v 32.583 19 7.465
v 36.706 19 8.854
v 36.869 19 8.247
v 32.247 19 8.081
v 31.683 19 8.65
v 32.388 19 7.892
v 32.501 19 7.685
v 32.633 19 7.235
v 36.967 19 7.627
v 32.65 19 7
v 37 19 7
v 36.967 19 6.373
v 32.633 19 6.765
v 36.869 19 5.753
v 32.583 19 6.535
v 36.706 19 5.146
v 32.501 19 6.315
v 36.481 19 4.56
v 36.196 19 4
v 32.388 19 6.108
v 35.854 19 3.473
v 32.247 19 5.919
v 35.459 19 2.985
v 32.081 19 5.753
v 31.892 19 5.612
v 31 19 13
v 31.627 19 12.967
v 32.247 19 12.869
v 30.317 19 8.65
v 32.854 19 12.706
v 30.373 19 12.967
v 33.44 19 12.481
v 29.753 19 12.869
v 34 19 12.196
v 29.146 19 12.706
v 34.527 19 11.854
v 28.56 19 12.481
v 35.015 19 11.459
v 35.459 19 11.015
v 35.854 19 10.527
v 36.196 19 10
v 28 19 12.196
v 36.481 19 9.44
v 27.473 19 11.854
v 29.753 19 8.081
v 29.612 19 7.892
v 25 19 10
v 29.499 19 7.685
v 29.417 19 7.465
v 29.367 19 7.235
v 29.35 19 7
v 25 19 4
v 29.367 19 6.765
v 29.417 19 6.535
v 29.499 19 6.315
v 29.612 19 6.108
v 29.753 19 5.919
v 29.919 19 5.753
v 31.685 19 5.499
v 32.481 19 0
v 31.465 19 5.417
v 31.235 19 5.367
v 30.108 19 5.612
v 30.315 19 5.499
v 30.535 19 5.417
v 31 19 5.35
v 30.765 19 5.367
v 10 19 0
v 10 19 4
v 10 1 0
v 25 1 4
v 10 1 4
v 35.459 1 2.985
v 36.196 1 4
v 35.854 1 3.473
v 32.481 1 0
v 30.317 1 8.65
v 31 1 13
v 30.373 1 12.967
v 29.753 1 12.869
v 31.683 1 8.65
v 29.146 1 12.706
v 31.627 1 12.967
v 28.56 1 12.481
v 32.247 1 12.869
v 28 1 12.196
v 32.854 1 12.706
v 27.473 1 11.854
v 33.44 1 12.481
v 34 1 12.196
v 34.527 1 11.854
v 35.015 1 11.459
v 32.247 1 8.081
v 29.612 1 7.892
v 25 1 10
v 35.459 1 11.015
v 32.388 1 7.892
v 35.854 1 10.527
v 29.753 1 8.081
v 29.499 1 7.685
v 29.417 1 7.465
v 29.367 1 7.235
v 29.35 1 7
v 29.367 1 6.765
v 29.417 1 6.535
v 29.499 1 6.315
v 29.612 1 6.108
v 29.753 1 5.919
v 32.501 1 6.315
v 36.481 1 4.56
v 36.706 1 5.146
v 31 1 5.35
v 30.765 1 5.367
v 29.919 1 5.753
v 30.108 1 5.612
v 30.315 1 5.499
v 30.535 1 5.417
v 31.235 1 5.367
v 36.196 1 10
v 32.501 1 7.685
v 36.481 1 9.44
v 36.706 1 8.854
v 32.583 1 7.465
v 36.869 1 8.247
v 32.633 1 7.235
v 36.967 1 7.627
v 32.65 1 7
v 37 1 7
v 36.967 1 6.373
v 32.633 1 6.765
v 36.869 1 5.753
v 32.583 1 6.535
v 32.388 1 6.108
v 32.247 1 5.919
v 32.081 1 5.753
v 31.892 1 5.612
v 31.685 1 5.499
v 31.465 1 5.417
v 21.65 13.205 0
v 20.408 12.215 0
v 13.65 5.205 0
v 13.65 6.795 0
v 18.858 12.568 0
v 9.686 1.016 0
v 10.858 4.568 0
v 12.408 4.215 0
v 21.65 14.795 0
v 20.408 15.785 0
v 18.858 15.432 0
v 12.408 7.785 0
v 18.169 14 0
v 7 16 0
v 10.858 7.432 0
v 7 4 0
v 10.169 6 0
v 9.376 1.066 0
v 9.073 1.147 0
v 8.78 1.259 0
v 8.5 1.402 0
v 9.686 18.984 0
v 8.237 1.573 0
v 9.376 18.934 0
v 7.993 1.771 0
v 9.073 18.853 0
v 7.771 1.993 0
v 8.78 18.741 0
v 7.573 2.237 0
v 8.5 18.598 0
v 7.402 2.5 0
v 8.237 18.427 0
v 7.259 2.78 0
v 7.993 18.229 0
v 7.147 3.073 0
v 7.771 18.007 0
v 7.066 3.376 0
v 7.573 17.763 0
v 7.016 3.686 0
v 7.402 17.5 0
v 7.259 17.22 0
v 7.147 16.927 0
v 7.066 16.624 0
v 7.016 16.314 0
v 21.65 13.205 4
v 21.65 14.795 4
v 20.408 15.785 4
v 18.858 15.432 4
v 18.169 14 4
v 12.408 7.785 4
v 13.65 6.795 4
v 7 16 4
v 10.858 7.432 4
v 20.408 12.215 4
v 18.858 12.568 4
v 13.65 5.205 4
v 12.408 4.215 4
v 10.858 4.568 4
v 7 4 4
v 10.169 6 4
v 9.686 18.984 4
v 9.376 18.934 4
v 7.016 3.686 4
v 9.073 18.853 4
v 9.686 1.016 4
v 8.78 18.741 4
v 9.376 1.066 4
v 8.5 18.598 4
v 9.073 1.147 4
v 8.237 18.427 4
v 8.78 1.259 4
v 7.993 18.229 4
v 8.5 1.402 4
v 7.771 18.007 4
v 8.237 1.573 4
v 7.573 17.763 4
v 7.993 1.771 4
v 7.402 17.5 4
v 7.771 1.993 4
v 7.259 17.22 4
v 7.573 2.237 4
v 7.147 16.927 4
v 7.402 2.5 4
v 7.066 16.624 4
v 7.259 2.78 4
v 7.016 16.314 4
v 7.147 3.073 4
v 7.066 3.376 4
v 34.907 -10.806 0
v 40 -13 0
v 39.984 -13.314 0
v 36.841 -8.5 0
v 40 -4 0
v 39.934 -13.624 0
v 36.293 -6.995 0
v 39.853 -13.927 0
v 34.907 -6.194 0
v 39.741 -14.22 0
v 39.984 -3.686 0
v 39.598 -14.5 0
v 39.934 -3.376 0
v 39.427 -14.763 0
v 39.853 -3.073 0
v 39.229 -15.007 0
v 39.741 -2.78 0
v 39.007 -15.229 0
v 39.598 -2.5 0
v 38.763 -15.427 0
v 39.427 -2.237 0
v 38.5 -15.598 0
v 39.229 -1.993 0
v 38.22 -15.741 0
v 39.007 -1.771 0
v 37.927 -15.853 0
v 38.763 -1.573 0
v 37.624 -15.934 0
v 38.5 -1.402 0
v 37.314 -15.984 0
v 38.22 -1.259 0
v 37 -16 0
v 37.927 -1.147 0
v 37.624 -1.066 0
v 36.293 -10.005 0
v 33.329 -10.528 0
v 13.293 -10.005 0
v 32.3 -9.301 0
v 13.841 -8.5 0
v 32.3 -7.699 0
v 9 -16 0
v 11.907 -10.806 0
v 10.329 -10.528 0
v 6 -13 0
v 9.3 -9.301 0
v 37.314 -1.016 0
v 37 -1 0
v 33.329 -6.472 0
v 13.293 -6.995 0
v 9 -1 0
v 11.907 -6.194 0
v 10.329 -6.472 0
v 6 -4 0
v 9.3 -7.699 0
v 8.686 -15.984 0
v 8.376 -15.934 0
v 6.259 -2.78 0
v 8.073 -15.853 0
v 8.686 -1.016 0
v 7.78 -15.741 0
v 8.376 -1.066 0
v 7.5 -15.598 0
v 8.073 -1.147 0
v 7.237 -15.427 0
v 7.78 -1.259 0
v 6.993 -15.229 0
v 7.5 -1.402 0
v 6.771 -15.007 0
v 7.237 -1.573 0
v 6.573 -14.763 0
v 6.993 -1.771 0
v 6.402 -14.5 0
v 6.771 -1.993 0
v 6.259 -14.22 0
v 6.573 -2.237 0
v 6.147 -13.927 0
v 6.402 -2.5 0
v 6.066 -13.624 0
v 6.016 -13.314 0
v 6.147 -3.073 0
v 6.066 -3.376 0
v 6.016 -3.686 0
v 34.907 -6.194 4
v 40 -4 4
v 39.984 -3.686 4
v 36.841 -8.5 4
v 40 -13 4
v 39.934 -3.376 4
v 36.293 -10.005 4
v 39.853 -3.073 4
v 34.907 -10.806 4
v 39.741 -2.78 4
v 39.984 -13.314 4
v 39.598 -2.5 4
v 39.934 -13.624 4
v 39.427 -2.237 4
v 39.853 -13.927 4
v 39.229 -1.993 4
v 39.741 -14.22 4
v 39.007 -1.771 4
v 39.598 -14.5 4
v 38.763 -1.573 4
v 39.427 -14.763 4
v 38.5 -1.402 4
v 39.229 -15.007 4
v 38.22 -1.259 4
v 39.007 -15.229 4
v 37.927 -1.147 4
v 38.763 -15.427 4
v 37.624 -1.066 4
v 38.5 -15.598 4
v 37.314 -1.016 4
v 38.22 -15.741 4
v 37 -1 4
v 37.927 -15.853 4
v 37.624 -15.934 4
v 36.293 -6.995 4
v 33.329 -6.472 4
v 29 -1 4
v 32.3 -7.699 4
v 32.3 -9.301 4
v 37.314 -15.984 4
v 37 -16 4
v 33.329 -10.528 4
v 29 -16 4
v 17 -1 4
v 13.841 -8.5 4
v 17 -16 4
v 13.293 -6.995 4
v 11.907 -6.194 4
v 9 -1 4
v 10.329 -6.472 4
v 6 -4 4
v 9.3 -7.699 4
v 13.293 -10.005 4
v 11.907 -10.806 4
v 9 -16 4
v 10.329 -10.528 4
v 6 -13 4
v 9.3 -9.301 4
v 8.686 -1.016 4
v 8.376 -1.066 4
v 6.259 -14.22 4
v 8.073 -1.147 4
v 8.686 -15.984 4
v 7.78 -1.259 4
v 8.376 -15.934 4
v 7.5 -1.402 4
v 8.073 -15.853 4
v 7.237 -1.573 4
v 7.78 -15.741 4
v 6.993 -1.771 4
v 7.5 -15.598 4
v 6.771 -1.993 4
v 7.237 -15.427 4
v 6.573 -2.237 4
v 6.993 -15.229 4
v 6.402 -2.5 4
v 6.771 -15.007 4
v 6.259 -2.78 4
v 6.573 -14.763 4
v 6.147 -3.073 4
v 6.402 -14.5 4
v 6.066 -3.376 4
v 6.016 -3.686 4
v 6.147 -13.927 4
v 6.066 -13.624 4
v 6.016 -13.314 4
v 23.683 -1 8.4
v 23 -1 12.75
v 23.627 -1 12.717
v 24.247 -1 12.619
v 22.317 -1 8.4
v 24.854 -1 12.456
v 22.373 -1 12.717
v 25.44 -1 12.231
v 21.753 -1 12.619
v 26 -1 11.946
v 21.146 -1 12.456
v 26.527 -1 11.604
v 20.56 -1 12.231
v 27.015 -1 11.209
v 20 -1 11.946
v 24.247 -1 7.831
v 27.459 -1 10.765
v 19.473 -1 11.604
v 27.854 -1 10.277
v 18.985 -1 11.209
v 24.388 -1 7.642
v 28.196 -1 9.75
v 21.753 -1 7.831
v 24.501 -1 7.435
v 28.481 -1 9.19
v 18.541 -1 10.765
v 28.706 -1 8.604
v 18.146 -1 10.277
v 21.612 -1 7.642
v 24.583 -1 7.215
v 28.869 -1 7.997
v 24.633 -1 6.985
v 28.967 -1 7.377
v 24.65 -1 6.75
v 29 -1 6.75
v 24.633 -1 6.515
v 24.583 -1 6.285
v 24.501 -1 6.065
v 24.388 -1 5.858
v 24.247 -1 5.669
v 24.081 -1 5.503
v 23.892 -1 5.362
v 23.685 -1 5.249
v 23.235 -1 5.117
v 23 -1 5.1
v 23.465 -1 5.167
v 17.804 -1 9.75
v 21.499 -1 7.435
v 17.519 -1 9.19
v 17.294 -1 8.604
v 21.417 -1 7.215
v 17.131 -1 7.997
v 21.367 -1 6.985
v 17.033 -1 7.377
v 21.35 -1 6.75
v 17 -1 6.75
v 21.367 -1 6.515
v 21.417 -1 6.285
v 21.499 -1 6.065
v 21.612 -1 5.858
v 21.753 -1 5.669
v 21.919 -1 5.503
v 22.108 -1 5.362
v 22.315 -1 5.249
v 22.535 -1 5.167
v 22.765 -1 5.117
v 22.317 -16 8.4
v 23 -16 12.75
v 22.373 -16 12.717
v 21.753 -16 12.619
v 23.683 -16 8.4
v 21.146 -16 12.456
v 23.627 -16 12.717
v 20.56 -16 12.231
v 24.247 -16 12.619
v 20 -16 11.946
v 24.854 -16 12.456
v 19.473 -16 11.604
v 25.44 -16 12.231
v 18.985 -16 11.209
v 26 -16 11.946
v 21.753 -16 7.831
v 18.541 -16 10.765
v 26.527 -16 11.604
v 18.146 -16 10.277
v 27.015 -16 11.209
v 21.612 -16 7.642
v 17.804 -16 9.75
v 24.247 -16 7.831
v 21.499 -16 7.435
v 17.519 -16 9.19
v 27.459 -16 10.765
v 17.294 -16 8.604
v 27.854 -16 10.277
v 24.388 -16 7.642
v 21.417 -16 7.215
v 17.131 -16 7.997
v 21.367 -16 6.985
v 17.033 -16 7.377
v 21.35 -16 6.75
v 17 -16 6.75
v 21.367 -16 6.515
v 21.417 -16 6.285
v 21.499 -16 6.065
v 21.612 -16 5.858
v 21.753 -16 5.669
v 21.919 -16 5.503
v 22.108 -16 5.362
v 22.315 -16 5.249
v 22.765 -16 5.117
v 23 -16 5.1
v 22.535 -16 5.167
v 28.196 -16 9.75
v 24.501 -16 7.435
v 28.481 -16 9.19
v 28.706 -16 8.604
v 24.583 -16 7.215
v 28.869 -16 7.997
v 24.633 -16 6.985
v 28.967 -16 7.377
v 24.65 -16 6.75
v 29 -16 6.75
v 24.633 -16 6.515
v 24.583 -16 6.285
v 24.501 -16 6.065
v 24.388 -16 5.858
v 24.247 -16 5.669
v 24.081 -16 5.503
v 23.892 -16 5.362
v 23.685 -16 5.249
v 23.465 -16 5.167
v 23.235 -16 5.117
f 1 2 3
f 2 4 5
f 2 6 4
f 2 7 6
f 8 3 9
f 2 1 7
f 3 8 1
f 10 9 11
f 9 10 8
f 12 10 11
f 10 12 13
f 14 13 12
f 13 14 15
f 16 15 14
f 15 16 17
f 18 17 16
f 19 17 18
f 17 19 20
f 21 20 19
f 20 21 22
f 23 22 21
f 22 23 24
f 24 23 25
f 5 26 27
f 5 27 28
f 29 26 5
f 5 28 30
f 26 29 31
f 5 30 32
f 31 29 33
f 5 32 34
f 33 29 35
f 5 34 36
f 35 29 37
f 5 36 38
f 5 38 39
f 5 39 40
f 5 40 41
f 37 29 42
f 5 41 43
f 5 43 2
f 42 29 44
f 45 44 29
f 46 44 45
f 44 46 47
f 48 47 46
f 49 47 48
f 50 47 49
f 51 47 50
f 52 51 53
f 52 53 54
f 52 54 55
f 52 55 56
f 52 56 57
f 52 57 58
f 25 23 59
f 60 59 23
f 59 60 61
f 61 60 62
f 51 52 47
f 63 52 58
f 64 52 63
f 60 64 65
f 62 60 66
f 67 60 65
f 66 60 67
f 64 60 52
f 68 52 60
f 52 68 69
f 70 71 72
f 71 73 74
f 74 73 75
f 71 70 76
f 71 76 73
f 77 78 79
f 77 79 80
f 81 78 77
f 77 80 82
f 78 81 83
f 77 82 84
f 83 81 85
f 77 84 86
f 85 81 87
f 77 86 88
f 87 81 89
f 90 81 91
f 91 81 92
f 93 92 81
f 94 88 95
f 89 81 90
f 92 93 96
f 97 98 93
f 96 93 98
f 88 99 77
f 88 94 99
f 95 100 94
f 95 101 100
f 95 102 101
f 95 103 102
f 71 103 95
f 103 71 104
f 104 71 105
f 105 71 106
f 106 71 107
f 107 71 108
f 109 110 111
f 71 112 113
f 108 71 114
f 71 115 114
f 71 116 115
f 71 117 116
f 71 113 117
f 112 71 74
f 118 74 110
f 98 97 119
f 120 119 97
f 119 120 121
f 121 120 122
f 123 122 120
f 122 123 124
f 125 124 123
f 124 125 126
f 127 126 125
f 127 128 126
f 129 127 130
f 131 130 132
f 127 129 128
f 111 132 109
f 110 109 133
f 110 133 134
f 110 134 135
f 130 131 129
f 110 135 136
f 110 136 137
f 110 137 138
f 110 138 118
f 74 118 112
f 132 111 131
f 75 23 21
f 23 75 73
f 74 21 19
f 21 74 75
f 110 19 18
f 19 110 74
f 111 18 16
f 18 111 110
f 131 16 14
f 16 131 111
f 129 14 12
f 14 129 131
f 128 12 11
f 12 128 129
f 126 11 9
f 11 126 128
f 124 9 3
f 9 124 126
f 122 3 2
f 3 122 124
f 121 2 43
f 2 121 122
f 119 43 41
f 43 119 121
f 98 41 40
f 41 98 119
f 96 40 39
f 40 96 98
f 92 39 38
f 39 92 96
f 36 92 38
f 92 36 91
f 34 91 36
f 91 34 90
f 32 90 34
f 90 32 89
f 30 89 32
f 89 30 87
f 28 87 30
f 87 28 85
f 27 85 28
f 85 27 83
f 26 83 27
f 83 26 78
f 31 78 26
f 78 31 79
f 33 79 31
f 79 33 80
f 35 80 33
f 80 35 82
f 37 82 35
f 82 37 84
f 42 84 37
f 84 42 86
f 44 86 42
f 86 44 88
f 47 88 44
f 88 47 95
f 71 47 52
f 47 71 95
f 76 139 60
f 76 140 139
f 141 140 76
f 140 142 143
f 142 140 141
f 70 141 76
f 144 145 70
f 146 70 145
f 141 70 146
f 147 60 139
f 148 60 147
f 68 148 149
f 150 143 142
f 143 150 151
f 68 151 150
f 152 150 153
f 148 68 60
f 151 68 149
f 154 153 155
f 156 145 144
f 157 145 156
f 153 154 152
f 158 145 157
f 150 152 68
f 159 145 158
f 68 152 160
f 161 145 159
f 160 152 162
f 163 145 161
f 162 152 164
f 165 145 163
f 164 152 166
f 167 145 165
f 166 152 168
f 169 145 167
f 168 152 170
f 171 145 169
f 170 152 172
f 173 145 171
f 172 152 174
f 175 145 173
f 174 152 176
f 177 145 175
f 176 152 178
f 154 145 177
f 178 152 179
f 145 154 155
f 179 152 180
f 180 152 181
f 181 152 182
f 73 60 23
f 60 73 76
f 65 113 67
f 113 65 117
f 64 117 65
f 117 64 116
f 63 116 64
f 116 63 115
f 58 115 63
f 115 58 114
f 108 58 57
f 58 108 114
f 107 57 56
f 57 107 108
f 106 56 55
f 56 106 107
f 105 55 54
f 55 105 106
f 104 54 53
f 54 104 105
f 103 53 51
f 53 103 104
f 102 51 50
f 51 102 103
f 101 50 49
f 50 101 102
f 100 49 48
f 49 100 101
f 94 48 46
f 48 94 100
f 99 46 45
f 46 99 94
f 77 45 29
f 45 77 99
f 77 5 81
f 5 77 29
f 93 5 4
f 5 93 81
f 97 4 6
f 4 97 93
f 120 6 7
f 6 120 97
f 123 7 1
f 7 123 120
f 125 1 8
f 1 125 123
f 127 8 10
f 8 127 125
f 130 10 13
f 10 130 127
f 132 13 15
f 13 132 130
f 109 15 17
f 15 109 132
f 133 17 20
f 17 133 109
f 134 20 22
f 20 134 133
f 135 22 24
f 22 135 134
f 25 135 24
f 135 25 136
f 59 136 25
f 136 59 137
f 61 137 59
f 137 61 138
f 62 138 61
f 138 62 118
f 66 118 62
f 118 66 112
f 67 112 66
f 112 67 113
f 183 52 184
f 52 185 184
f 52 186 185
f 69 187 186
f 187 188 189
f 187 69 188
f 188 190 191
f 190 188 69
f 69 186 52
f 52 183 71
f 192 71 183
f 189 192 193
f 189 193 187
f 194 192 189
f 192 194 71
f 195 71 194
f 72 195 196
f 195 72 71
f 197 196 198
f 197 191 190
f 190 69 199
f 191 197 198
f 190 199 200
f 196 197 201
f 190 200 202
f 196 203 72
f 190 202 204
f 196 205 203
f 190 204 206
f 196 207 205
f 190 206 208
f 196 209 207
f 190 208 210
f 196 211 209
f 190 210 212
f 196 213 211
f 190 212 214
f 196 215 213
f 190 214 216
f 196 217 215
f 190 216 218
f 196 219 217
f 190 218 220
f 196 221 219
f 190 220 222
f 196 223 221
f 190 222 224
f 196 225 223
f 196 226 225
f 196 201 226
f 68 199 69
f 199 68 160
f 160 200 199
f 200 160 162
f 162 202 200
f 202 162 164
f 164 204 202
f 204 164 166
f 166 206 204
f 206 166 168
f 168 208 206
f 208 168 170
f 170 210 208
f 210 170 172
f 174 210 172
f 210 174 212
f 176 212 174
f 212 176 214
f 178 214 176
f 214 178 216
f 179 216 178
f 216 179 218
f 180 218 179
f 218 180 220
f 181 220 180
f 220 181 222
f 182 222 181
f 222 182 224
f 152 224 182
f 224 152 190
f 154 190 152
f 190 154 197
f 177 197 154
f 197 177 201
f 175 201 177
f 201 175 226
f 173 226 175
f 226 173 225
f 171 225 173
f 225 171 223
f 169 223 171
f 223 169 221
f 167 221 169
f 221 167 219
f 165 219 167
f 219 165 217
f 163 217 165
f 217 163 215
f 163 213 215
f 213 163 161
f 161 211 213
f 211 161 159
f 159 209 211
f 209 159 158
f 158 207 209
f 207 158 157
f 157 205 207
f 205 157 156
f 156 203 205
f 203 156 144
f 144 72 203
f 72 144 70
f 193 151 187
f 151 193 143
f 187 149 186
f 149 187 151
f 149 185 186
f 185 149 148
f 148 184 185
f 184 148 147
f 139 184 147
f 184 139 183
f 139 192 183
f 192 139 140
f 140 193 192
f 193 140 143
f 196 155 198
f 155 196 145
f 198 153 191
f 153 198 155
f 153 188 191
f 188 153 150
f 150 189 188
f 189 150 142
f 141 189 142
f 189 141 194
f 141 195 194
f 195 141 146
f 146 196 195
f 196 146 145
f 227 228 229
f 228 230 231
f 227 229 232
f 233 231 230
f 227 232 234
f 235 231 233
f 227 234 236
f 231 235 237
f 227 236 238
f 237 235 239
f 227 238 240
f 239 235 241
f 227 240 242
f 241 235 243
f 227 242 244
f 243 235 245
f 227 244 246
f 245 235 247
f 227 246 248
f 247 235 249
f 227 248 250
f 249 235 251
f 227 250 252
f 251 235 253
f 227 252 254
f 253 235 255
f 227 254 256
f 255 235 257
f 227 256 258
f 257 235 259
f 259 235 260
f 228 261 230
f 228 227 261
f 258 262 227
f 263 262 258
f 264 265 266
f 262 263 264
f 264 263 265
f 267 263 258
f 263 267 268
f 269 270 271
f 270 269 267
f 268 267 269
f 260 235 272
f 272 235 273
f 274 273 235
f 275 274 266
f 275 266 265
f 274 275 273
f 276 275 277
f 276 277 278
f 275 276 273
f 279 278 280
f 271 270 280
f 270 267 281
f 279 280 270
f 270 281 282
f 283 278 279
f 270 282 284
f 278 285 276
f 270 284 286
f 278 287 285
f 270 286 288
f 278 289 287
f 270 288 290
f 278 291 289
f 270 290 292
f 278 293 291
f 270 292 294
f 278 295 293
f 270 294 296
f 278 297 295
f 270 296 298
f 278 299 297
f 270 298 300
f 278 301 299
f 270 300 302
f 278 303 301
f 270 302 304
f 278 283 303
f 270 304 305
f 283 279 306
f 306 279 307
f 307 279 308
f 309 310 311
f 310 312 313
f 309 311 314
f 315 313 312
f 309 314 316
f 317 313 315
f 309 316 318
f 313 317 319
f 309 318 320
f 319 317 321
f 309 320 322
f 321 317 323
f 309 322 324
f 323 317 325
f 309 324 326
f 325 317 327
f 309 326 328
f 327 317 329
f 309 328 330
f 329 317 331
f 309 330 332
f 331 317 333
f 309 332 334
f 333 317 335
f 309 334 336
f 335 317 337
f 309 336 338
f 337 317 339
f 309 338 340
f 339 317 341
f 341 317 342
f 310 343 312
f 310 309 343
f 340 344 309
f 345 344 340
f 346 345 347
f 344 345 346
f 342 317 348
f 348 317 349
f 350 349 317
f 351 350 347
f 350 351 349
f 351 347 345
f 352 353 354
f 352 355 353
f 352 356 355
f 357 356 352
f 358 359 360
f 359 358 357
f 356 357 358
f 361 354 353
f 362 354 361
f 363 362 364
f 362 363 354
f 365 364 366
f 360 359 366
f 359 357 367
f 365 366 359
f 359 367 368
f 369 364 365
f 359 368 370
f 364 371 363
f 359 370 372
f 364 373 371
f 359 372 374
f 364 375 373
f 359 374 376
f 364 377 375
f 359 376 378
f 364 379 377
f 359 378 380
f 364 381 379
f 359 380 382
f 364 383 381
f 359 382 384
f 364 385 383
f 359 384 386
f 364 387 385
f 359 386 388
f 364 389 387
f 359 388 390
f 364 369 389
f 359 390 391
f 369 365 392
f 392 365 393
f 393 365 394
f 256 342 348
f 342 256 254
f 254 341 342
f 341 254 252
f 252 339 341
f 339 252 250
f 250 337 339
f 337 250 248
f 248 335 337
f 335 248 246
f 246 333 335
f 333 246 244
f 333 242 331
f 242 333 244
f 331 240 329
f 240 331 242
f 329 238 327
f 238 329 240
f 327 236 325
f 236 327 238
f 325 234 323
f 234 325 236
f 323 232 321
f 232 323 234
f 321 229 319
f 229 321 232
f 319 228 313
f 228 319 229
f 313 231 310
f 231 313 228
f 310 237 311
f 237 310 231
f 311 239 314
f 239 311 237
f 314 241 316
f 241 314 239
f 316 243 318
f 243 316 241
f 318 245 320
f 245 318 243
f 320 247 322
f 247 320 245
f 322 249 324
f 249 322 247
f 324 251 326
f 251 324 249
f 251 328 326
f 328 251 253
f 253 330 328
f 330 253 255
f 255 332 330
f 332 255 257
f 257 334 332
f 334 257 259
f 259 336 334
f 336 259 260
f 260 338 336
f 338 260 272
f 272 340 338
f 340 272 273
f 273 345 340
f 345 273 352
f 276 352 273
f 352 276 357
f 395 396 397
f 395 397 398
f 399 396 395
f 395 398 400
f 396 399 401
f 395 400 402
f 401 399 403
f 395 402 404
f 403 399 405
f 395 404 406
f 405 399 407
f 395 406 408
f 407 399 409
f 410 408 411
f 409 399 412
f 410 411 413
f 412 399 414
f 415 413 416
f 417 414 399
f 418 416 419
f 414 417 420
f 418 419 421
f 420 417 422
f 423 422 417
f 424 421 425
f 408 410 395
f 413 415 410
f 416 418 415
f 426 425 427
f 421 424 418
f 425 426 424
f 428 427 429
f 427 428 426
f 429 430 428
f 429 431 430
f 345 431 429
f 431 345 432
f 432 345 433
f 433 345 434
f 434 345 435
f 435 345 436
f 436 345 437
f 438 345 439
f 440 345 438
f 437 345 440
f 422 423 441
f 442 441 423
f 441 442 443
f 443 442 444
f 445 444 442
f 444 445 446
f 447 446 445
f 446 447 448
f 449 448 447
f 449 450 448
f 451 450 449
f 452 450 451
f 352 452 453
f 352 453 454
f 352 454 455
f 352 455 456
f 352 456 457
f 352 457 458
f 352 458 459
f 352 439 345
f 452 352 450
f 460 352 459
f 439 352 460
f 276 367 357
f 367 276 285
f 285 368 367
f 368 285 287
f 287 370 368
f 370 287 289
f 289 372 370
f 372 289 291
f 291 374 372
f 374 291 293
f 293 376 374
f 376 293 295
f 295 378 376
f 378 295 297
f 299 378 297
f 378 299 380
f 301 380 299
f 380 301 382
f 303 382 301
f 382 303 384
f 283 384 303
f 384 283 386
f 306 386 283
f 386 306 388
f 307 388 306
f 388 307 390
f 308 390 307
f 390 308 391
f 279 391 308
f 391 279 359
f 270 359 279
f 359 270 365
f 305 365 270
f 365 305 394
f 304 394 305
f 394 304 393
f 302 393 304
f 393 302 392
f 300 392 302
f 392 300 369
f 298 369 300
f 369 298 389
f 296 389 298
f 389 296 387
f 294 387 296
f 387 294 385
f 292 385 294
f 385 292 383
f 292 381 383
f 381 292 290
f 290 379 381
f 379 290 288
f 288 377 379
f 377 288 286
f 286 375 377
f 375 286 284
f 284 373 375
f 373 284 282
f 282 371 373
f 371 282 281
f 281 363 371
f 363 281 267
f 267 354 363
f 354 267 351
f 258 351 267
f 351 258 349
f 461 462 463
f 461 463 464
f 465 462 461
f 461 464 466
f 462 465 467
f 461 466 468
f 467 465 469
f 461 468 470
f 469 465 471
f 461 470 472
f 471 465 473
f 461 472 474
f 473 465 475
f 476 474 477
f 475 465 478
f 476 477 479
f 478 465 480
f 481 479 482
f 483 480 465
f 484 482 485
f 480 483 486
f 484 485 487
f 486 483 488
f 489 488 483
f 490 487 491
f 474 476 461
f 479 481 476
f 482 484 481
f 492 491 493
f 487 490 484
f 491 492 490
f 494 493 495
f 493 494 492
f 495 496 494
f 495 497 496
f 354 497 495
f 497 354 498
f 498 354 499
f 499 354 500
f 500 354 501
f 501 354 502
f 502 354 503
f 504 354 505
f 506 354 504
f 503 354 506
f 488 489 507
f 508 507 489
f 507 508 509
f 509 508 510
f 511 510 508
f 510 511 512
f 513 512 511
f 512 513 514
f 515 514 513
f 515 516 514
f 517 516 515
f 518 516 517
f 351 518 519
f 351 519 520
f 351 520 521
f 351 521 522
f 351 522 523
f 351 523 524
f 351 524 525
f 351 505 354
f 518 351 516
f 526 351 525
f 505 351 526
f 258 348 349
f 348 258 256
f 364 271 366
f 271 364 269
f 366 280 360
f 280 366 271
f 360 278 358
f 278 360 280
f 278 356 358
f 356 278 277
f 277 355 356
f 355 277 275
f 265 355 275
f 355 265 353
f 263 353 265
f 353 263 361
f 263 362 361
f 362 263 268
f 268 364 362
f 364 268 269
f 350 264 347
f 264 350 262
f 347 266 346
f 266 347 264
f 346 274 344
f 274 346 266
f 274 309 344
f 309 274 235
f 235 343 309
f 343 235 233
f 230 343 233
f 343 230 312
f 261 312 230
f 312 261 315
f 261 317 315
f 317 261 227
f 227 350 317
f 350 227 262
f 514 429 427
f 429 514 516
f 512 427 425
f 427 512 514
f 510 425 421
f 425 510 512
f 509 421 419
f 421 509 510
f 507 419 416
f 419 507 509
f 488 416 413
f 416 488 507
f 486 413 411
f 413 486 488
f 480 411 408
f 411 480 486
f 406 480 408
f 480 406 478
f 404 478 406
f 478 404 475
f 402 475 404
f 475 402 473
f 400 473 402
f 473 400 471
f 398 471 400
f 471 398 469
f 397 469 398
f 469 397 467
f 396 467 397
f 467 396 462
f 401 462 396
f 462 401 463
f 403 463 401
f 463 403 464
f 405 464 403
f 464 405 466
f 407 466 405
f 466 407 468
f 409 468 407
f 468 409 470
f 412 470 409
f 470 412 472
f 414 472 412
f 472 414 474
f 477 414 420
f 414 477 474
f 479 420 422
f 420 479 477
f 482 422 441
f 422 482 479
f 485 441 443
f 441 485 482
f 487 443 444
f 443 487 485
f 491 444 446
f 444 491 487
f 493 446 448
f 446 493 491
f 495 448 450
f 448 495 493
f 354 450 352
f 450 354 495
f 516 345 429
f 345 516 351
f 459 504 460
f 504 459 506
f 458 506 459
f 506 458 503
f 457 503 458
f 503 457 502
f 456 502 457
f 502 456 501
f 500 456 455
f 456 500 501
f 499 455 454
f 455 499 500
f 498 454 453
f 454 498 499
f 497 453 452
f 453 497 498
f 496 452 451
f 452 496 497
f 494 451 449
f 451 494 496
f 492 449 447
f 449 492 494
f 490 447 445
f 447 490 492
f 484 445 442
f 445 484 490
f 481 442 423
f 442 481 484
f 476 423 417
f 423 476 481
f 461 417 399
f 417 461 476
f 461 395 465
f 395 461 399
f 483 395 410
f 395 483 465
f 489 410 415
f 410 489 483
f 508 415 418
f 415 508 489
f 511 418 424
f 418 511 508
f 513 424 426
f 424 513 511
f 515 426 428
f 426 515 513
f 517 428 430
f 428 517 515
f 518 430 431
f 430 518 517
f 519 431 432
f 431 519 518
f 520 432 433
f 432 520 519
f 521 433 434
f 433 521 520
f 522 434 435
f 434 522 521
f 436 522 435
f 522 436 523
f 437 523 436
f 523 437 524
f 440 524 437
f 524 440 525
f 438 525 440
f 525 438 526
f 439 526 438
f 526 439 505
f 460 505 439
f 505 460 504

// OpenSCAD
//
// NopSCADlib Copyright Chris Palmer 2018
// nop.head@gmail.com
// hydraraptor.blogspot.com
//
// This file is part of NopSCADlib.
//
// NopSCADlib is free software: you can redistribute it and/or modify it under the terms of the
// GNU General Public License as published by the Free Software Foundation, either version 3 of
// the License, or (at your option) any later version.
//
// NopSCADlib is distributed in the hope that it will be useful, but WITHOUT ANY WARRANTY;
// without even the implied warranty of MERCHANTABILITY or FITNESS FOR A PARTICULAR PURPOSE.
// See the GNU General Public License for more details.
//
// You should have received a copy of the GNU General Public License along with NopSCADlib.
// If not, see <https://www.gnu.org/licenses/>.
//
include <../core.scad>
use <../door_hinge.scad>

include <../vitamins/sheets.scad>
use <../vitamins/screw.scad>

door_w = 50;
door_h = 50;
sheet = PMMA6;

module door_hinges() {
    translate([door_hinge_stat_length() / 2 - door_hinge_pin_x(), 0])
        if($preview) {
            for(side = [-1, 1])
                translate_z(side * door_h / 2) {
                    door_hinge_assembly(side > 0, sheet_thickness(sheet));

                    door_hinge_static_assembly(side > 0, 3);
                }

            translate([door_w / 2 + eps, door_hinge_pin_y() - eps])
                rotate([90, 0, 0])
                    render_2D_sheet(sheet)
                        difference() {
                            sheet_2D(sheet, door_w, door_h, 3);

                            for(z =[-1, 1])
                                translate([-door_w / 2, z * door_h / 2])
                                    door_hinge_hole_positions(z)
                                        drill(screw_pilot_hole(door_hinge_screw()), 0);
                        }
            translate([door_w, 0])
                children();
        }
        else
            door_hinge_parts_stl();
}

door_hinges();
